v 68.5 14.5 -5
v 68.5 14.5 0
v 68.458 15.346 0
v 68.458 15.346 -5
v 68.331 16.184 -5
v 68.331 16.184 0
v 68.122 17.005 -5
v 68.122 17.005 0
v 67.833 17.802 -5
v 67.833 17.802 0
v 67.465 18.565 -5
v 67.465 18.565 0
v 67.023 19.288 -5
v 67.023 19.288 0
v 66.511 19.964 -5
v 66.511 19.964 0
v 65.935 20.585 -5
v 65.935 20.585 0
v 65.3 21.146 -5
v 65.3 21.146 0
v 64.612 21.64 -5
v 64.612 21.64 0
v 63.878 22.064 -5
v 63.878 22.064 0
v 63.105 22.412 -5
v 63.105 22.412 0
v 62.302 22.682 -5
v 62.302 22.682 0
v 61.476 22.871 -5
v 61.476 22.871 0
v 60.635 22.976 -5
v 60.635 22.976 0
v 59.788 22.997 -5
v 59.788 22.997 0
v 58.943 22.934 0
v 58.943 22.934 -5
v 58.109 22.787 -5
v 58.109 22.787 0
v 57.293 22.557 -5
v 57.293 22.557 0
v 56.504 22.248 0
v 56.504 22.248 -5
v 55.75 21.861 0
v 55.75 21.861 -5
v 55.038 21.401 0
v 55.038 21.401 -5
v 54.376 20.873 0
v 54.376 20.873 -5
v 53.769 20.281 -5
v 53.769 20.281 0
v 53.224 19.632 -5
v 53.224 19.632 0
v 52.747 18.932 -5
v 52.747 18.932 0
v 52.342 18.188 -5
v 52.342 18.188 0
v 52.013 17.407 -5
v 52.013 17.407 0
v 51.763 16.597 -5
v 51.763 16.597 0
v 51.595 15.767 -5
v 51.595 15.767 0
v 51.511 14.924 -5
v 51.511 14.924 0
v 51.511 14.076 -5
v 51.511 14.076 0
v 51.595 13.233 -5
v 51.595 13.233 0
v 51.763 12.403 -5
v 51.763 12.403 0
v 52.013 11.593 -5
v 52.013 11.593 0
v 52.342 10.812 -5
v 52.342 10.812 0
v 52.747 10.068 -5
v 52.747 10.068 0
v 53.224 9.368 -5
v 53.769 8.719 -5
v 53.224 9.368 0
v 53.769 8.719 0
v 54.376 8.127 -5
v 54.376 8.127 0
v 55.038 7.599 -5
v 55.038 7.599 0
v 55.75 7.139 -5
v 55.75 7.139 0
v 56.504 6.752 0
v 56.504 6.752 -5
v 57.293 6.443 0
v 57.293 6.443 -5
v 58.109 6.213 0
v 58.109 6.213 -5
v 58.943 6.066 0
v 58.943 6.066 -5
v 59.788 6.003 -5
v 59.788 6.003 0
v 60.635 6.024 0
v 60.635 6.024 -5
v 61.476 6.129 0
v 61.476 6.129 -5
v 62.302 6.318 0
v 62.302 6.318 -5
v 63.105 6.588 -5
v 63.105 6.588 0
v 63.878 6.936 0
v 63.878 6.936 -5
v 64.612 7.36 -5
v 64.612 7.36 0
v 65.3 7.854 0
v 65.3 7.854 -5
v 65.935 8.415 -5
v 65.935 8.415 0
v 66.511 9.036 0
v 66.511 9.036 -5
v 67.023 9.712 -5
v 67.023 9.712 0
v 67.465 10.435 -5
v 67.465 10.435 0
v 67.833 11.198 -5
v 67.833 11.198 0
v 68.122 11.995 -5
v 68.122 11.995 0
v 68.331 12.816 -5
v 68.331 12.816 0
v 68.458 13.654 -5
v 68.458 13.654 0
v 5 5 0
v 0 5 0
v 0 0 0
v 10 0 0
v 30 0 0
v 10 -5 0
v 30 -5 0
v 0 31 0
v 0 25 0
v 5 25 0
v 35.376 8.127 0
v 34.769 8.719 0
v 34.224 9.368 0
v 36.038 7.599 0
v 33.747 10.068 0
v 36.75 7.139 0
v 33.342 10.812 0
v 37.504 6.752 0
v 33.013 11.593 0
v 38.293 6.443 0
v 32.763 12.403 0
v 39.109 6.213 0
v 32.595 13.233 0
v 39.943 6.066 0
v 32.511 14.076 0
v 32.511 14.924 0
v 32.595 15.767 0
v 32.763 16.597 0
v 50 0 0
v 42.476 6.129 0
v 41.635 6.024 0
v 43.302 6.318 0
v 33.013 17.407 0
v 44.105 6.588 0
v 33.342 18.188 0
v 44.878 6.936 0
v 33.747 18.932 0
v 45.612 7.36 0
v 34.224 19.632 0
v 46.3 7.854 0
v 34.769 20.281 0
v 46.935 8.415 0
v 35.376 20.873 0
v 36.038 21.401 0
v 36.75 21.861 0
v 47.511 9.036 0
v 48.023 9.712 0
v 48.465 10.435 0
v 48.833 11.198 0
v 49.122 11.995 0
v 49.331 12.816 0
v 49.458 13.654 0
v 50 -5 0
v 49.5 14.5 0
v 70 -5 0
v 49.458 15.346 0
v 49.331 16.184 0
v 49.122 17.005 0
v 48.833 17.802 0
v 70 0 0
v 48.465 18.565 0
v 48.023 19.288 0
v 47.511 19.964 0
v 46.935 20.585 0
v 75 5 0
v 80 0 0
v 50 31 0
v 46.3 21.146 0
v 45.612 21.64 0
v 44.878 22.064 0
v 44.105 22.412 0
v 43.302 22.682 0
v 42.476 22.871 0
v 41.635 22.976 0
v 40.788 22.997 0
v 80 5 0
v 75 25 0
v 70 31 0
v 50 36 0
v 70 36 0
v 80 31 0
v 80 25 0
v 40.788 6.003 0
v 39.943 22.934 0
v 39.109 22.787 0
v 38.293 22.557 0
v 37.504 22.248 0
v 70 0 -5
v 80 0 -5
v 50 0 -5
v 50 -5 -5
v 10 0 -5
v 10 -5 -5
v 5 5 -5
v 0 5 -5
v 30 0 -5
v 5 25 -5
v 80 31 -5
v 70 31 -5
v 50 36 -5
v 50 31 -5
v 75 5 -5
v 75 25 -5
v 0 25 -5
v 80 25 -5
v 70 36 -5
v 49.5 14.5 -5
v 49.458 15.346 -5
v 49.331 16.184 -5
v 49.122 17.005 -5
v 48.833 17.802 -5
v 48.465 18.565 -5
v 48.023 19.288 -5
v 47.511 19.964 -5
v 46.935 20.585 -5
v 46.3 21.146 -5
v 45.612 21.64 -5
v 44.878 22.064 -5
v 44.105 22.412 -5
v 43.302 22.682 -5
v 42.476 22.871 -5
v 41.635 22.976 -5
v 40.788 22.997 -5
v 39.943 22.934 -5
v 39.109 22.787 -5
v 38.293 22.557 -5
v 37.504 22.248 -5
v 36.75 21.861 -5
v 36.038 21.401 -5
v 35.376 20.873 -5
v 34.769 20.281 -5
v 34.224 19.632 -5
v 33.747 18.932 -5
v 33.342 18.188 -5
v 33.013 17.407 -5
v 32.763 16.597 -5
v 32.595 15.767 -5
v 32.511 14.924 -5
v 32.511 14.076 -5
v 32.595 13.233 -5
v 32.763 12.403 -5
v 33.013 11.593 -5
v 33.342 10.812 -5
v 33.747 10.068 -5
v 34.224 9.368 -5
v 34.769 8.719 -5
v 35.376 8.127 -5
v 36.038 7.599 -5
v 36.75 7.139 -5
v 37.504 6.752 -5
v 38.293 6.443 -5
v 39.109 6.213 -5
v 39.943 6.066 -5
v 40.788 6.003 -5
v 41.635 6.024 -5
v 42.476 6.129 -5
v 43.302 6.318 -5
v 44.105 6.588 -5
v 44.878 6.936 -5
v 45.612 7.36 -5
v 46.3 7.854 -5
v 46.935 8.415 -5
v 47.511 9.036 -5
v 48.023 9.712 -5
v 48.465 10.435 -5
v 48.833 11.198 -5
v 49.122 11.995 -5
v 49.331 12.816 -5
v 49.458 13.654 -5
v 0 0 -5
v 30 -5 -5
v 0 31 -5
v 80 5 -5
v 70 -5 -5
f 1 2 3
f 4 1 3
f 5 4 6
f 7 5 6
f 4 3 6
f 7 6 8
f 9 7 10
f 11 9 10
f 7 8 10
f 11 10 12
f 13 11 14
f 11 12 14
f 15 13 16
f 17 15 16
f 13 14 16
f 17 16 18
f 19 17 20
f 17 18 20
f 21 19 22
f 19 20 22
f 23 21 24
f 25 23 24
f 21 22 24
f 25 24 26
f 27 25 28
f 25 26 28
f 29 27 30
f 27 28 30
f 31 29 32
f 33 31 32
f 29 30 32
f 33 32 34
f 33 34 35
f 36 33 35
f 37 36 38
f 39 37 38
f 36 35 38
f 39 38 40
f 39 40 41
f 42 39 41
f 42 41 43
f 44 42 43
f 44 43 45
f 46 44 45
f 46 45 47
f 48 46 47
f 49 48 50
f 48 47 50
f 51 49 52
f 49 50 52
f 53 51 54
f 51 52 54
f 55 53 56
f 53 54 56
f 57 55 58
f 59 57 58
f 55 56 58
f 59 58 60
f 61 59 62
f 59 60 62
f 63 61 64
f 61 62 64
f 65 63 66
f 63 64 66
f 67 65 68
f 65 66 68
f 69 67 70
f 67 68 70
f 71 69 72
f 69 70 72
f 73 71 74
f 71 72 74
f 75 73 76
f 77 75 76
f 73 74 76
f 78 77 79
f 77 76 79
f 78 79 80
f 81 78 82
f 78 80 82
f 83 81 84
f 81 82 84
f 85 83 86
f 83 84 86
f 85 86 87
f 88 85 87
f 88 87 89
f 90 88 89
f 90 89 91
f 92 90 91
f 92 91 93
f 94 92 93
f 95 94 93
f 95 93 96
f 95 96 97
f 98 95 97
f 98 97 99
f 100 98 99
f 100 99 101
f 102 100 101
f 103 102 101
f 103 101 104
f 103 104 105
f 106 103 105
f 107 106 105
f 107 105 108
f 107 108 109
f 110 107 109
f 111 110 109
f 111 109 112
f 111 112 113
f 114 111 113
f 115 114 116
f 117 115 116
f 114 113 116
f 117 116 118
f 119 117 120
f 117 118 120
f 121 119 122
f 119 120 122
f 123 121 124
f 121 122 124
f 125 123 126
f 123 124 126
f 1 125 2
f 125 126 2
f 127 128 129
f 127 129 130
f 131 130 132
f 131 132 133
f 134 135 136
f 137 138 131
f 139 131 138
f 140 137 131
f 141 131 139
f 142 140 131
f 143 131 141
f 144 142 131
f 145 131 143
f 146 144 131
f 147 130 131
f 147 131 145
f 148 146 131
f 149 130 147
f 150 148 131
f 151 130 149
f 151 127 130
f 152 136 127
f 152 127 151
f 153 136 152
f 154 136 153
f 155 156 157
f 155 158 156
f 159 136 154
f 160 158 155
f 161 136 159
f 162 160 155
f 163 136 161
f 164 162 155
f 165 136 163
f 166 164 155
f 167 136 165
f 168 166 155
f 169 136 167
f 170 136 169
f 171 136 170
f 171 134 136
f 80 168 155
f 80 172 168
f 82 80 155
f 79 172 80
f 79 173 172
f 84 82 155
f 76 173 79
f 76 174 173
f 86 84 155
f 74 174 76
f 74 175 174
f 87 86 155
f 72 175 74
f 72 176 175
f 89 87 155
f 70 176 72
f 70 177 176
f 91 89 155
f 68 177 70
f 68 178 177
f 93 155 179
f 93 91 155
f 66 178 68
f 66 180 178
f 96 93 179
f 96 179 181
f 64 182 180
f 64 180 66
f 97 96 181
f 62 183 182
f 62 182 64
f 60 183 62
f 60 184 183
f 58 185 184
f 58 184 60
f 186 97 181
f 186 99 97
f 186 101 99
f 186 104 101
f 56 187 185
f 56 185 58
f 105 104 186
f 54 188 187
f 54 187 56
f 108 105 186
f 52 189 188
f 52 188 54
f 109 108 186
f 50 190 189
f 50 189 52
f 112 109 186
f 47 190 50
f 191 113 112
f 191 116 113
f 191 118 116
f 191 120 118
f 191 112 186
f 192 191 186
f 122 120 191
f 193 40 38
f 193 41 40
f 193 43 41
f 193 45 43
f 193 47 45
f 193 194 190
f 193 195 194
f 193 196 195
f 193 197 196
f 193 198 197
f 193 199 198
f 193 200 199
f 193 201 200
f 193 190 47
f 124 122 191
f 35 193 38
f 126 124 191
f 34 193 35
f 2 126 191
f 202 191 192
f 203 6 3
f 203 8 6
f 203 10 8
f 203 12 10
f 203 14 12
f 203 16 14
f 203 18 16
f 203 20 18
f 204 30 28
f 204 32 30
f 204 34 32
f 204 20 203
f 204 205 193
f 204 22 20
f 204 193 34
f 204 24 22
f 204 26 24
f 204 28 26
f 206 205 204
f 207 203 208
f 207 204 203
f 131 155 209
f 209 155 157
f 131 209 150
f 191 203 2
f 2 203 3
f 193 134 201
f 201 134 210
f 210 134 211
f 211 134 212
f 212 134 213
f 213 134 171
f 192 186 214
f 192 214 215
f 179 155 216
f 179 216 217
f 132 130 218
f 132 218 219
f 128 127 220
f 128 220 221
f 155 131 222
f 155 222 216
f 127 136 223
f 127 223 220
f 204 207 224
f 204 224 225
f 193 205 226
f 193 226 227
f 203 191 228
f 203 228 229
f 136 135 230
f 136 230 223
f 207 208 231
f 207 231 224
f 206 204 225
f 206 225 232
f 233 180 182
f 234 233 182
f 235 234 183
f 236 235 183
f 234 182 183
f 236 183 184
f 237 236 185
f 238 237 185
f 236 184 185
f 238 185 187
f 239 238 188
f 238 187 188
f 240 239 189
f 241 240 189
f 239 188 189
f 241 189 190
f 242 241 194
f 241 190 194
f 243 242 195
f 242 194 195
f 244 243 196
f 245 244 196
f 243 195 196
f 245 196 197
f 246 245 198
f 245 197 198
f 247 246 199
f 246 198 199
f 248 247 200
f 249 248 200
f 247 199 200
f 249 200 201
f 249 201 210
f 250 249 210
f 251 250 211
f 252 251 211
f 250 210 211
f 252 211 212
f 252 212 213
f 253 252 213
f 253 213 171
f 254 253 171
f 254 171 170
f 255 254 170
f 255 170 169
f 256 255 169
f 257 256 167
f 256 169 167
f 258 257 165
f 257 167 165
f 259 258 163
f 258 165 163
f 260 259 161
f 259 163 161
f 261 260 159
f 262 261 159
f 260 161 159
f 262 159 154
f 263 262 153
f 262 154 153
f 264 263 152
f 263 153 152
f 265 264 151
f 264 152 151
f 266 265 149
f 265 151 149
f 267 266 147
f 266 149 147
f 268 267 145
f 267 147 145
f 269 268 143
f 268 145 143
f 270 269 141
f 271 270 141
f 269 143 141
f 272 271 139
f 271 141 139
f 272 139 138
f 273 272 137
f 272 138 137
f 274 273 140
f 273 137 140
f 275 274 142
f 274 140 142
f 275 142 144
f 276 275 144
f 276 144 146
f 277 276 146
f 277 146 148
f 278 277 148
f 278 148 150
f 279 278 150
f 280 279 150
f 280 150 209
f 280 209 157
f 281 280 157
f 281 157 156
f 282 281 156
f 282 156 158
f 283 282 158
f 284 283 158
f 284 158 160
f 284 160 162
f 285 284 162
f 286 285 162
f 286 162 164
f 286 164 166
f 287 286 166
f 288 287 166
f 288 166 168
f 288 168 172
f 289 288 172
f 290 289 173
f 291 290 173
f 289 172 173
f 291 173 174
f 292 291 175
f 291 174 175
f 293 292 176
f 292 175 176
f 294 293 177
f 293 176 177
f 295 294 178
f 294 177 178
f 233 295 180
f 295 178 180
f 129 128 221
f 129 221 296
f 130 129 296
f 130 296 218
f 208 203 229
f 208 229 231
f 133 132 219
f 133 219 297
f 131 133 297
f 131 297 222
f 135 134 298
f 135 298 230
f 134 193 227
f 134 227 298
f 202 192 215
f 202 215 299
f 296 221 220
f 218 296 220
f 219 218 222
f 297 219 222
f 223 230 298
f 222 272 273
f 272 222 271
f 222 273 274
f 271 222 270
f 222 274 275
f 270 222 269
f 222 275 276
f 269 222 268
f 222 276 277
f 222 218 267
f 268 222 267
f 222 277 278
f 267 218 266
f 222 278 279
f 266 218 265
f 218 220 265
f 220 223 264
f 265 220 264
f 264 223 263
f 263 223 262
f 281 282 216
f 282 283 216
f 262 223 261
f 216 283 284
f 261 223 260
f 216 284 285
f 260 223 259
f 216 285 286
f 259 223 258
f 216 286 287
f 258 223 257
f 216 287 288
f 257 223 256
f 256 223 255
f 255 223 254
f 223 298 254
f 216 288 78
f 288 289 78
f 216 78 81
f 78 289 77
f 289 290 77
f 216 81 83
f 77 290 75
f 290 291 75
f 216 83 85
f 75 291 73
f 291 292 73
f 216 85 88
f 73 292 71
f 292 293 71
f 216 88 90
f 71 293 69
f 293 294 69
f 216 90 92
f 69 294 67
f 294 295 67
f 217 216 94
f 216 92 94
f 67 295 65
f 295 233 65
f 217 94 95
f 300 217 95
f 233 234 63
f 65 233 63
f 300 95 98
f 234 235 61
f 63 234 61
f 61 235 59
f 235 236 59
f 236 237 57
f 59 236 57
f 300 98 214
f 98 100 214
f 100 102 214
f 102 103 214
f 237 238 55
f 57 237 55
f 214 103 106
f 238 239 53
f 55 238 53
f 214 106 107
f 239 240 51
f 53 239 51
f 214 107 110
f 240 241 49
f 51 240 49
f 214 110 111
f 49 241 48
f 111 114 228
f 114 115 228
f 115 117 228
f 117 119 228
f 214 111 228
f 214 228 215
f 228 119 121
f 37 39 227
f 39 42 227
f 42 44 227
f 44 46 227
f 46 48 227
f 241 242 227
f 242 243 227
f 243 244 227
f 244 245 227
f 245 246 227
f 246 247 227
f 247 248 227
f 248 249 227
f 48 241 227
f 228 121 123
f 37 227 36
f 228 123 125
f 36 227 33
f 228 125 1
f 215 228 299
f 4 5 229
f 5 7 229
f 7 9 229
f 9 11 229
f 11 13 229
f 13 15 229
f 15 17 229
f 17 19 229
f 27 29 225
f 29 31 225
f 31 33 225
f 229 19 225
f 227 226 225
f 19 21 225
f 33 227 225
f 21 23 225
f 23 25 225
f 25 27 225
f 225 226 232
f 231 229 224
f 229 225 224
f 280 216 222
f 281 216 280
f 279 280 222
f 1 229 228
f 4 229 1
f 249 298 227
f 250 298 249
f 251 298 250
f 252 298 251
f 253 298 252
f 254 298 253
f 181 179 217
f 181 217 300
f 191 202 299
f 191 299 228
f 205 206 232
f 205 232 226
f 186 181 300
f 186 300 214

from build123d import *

# Parameters (mm, degrees)
SKETCH2_R           = 8.5
BOSS_EXTRUDE1_DEPTH = 5


with BuildPart() as part:
    # Sketch2 → Boss-Extrude1 (new body)
    with BuildSketch(Plane.XY):
        Polygon((0, 31), (0, 25), (5, 25), (5, 5), (0, 5), (0, 0), (10, 0), (10, -5), (30, -5), (30, 0), (50, 0), (50, -5), (70, -5), (70, 0), (80, 0), (80, 5), (75, 5), (75, 25), (80, 25), (80, 31), (70, 31), (70, 36), (50, 36), (50, 31), align=None)
        with Locations((41, 14.5)):
            Circle(SKETCH2_R, mode=Mode.SUBTRACT)
        with Locations((60, 14.5)):
            Circle(SKETCH2_R, mode=Mode.SUBTRACT)
    extrude(amount=-BOSS_EXTRUDE1_DEPTH)


solid = part.part
